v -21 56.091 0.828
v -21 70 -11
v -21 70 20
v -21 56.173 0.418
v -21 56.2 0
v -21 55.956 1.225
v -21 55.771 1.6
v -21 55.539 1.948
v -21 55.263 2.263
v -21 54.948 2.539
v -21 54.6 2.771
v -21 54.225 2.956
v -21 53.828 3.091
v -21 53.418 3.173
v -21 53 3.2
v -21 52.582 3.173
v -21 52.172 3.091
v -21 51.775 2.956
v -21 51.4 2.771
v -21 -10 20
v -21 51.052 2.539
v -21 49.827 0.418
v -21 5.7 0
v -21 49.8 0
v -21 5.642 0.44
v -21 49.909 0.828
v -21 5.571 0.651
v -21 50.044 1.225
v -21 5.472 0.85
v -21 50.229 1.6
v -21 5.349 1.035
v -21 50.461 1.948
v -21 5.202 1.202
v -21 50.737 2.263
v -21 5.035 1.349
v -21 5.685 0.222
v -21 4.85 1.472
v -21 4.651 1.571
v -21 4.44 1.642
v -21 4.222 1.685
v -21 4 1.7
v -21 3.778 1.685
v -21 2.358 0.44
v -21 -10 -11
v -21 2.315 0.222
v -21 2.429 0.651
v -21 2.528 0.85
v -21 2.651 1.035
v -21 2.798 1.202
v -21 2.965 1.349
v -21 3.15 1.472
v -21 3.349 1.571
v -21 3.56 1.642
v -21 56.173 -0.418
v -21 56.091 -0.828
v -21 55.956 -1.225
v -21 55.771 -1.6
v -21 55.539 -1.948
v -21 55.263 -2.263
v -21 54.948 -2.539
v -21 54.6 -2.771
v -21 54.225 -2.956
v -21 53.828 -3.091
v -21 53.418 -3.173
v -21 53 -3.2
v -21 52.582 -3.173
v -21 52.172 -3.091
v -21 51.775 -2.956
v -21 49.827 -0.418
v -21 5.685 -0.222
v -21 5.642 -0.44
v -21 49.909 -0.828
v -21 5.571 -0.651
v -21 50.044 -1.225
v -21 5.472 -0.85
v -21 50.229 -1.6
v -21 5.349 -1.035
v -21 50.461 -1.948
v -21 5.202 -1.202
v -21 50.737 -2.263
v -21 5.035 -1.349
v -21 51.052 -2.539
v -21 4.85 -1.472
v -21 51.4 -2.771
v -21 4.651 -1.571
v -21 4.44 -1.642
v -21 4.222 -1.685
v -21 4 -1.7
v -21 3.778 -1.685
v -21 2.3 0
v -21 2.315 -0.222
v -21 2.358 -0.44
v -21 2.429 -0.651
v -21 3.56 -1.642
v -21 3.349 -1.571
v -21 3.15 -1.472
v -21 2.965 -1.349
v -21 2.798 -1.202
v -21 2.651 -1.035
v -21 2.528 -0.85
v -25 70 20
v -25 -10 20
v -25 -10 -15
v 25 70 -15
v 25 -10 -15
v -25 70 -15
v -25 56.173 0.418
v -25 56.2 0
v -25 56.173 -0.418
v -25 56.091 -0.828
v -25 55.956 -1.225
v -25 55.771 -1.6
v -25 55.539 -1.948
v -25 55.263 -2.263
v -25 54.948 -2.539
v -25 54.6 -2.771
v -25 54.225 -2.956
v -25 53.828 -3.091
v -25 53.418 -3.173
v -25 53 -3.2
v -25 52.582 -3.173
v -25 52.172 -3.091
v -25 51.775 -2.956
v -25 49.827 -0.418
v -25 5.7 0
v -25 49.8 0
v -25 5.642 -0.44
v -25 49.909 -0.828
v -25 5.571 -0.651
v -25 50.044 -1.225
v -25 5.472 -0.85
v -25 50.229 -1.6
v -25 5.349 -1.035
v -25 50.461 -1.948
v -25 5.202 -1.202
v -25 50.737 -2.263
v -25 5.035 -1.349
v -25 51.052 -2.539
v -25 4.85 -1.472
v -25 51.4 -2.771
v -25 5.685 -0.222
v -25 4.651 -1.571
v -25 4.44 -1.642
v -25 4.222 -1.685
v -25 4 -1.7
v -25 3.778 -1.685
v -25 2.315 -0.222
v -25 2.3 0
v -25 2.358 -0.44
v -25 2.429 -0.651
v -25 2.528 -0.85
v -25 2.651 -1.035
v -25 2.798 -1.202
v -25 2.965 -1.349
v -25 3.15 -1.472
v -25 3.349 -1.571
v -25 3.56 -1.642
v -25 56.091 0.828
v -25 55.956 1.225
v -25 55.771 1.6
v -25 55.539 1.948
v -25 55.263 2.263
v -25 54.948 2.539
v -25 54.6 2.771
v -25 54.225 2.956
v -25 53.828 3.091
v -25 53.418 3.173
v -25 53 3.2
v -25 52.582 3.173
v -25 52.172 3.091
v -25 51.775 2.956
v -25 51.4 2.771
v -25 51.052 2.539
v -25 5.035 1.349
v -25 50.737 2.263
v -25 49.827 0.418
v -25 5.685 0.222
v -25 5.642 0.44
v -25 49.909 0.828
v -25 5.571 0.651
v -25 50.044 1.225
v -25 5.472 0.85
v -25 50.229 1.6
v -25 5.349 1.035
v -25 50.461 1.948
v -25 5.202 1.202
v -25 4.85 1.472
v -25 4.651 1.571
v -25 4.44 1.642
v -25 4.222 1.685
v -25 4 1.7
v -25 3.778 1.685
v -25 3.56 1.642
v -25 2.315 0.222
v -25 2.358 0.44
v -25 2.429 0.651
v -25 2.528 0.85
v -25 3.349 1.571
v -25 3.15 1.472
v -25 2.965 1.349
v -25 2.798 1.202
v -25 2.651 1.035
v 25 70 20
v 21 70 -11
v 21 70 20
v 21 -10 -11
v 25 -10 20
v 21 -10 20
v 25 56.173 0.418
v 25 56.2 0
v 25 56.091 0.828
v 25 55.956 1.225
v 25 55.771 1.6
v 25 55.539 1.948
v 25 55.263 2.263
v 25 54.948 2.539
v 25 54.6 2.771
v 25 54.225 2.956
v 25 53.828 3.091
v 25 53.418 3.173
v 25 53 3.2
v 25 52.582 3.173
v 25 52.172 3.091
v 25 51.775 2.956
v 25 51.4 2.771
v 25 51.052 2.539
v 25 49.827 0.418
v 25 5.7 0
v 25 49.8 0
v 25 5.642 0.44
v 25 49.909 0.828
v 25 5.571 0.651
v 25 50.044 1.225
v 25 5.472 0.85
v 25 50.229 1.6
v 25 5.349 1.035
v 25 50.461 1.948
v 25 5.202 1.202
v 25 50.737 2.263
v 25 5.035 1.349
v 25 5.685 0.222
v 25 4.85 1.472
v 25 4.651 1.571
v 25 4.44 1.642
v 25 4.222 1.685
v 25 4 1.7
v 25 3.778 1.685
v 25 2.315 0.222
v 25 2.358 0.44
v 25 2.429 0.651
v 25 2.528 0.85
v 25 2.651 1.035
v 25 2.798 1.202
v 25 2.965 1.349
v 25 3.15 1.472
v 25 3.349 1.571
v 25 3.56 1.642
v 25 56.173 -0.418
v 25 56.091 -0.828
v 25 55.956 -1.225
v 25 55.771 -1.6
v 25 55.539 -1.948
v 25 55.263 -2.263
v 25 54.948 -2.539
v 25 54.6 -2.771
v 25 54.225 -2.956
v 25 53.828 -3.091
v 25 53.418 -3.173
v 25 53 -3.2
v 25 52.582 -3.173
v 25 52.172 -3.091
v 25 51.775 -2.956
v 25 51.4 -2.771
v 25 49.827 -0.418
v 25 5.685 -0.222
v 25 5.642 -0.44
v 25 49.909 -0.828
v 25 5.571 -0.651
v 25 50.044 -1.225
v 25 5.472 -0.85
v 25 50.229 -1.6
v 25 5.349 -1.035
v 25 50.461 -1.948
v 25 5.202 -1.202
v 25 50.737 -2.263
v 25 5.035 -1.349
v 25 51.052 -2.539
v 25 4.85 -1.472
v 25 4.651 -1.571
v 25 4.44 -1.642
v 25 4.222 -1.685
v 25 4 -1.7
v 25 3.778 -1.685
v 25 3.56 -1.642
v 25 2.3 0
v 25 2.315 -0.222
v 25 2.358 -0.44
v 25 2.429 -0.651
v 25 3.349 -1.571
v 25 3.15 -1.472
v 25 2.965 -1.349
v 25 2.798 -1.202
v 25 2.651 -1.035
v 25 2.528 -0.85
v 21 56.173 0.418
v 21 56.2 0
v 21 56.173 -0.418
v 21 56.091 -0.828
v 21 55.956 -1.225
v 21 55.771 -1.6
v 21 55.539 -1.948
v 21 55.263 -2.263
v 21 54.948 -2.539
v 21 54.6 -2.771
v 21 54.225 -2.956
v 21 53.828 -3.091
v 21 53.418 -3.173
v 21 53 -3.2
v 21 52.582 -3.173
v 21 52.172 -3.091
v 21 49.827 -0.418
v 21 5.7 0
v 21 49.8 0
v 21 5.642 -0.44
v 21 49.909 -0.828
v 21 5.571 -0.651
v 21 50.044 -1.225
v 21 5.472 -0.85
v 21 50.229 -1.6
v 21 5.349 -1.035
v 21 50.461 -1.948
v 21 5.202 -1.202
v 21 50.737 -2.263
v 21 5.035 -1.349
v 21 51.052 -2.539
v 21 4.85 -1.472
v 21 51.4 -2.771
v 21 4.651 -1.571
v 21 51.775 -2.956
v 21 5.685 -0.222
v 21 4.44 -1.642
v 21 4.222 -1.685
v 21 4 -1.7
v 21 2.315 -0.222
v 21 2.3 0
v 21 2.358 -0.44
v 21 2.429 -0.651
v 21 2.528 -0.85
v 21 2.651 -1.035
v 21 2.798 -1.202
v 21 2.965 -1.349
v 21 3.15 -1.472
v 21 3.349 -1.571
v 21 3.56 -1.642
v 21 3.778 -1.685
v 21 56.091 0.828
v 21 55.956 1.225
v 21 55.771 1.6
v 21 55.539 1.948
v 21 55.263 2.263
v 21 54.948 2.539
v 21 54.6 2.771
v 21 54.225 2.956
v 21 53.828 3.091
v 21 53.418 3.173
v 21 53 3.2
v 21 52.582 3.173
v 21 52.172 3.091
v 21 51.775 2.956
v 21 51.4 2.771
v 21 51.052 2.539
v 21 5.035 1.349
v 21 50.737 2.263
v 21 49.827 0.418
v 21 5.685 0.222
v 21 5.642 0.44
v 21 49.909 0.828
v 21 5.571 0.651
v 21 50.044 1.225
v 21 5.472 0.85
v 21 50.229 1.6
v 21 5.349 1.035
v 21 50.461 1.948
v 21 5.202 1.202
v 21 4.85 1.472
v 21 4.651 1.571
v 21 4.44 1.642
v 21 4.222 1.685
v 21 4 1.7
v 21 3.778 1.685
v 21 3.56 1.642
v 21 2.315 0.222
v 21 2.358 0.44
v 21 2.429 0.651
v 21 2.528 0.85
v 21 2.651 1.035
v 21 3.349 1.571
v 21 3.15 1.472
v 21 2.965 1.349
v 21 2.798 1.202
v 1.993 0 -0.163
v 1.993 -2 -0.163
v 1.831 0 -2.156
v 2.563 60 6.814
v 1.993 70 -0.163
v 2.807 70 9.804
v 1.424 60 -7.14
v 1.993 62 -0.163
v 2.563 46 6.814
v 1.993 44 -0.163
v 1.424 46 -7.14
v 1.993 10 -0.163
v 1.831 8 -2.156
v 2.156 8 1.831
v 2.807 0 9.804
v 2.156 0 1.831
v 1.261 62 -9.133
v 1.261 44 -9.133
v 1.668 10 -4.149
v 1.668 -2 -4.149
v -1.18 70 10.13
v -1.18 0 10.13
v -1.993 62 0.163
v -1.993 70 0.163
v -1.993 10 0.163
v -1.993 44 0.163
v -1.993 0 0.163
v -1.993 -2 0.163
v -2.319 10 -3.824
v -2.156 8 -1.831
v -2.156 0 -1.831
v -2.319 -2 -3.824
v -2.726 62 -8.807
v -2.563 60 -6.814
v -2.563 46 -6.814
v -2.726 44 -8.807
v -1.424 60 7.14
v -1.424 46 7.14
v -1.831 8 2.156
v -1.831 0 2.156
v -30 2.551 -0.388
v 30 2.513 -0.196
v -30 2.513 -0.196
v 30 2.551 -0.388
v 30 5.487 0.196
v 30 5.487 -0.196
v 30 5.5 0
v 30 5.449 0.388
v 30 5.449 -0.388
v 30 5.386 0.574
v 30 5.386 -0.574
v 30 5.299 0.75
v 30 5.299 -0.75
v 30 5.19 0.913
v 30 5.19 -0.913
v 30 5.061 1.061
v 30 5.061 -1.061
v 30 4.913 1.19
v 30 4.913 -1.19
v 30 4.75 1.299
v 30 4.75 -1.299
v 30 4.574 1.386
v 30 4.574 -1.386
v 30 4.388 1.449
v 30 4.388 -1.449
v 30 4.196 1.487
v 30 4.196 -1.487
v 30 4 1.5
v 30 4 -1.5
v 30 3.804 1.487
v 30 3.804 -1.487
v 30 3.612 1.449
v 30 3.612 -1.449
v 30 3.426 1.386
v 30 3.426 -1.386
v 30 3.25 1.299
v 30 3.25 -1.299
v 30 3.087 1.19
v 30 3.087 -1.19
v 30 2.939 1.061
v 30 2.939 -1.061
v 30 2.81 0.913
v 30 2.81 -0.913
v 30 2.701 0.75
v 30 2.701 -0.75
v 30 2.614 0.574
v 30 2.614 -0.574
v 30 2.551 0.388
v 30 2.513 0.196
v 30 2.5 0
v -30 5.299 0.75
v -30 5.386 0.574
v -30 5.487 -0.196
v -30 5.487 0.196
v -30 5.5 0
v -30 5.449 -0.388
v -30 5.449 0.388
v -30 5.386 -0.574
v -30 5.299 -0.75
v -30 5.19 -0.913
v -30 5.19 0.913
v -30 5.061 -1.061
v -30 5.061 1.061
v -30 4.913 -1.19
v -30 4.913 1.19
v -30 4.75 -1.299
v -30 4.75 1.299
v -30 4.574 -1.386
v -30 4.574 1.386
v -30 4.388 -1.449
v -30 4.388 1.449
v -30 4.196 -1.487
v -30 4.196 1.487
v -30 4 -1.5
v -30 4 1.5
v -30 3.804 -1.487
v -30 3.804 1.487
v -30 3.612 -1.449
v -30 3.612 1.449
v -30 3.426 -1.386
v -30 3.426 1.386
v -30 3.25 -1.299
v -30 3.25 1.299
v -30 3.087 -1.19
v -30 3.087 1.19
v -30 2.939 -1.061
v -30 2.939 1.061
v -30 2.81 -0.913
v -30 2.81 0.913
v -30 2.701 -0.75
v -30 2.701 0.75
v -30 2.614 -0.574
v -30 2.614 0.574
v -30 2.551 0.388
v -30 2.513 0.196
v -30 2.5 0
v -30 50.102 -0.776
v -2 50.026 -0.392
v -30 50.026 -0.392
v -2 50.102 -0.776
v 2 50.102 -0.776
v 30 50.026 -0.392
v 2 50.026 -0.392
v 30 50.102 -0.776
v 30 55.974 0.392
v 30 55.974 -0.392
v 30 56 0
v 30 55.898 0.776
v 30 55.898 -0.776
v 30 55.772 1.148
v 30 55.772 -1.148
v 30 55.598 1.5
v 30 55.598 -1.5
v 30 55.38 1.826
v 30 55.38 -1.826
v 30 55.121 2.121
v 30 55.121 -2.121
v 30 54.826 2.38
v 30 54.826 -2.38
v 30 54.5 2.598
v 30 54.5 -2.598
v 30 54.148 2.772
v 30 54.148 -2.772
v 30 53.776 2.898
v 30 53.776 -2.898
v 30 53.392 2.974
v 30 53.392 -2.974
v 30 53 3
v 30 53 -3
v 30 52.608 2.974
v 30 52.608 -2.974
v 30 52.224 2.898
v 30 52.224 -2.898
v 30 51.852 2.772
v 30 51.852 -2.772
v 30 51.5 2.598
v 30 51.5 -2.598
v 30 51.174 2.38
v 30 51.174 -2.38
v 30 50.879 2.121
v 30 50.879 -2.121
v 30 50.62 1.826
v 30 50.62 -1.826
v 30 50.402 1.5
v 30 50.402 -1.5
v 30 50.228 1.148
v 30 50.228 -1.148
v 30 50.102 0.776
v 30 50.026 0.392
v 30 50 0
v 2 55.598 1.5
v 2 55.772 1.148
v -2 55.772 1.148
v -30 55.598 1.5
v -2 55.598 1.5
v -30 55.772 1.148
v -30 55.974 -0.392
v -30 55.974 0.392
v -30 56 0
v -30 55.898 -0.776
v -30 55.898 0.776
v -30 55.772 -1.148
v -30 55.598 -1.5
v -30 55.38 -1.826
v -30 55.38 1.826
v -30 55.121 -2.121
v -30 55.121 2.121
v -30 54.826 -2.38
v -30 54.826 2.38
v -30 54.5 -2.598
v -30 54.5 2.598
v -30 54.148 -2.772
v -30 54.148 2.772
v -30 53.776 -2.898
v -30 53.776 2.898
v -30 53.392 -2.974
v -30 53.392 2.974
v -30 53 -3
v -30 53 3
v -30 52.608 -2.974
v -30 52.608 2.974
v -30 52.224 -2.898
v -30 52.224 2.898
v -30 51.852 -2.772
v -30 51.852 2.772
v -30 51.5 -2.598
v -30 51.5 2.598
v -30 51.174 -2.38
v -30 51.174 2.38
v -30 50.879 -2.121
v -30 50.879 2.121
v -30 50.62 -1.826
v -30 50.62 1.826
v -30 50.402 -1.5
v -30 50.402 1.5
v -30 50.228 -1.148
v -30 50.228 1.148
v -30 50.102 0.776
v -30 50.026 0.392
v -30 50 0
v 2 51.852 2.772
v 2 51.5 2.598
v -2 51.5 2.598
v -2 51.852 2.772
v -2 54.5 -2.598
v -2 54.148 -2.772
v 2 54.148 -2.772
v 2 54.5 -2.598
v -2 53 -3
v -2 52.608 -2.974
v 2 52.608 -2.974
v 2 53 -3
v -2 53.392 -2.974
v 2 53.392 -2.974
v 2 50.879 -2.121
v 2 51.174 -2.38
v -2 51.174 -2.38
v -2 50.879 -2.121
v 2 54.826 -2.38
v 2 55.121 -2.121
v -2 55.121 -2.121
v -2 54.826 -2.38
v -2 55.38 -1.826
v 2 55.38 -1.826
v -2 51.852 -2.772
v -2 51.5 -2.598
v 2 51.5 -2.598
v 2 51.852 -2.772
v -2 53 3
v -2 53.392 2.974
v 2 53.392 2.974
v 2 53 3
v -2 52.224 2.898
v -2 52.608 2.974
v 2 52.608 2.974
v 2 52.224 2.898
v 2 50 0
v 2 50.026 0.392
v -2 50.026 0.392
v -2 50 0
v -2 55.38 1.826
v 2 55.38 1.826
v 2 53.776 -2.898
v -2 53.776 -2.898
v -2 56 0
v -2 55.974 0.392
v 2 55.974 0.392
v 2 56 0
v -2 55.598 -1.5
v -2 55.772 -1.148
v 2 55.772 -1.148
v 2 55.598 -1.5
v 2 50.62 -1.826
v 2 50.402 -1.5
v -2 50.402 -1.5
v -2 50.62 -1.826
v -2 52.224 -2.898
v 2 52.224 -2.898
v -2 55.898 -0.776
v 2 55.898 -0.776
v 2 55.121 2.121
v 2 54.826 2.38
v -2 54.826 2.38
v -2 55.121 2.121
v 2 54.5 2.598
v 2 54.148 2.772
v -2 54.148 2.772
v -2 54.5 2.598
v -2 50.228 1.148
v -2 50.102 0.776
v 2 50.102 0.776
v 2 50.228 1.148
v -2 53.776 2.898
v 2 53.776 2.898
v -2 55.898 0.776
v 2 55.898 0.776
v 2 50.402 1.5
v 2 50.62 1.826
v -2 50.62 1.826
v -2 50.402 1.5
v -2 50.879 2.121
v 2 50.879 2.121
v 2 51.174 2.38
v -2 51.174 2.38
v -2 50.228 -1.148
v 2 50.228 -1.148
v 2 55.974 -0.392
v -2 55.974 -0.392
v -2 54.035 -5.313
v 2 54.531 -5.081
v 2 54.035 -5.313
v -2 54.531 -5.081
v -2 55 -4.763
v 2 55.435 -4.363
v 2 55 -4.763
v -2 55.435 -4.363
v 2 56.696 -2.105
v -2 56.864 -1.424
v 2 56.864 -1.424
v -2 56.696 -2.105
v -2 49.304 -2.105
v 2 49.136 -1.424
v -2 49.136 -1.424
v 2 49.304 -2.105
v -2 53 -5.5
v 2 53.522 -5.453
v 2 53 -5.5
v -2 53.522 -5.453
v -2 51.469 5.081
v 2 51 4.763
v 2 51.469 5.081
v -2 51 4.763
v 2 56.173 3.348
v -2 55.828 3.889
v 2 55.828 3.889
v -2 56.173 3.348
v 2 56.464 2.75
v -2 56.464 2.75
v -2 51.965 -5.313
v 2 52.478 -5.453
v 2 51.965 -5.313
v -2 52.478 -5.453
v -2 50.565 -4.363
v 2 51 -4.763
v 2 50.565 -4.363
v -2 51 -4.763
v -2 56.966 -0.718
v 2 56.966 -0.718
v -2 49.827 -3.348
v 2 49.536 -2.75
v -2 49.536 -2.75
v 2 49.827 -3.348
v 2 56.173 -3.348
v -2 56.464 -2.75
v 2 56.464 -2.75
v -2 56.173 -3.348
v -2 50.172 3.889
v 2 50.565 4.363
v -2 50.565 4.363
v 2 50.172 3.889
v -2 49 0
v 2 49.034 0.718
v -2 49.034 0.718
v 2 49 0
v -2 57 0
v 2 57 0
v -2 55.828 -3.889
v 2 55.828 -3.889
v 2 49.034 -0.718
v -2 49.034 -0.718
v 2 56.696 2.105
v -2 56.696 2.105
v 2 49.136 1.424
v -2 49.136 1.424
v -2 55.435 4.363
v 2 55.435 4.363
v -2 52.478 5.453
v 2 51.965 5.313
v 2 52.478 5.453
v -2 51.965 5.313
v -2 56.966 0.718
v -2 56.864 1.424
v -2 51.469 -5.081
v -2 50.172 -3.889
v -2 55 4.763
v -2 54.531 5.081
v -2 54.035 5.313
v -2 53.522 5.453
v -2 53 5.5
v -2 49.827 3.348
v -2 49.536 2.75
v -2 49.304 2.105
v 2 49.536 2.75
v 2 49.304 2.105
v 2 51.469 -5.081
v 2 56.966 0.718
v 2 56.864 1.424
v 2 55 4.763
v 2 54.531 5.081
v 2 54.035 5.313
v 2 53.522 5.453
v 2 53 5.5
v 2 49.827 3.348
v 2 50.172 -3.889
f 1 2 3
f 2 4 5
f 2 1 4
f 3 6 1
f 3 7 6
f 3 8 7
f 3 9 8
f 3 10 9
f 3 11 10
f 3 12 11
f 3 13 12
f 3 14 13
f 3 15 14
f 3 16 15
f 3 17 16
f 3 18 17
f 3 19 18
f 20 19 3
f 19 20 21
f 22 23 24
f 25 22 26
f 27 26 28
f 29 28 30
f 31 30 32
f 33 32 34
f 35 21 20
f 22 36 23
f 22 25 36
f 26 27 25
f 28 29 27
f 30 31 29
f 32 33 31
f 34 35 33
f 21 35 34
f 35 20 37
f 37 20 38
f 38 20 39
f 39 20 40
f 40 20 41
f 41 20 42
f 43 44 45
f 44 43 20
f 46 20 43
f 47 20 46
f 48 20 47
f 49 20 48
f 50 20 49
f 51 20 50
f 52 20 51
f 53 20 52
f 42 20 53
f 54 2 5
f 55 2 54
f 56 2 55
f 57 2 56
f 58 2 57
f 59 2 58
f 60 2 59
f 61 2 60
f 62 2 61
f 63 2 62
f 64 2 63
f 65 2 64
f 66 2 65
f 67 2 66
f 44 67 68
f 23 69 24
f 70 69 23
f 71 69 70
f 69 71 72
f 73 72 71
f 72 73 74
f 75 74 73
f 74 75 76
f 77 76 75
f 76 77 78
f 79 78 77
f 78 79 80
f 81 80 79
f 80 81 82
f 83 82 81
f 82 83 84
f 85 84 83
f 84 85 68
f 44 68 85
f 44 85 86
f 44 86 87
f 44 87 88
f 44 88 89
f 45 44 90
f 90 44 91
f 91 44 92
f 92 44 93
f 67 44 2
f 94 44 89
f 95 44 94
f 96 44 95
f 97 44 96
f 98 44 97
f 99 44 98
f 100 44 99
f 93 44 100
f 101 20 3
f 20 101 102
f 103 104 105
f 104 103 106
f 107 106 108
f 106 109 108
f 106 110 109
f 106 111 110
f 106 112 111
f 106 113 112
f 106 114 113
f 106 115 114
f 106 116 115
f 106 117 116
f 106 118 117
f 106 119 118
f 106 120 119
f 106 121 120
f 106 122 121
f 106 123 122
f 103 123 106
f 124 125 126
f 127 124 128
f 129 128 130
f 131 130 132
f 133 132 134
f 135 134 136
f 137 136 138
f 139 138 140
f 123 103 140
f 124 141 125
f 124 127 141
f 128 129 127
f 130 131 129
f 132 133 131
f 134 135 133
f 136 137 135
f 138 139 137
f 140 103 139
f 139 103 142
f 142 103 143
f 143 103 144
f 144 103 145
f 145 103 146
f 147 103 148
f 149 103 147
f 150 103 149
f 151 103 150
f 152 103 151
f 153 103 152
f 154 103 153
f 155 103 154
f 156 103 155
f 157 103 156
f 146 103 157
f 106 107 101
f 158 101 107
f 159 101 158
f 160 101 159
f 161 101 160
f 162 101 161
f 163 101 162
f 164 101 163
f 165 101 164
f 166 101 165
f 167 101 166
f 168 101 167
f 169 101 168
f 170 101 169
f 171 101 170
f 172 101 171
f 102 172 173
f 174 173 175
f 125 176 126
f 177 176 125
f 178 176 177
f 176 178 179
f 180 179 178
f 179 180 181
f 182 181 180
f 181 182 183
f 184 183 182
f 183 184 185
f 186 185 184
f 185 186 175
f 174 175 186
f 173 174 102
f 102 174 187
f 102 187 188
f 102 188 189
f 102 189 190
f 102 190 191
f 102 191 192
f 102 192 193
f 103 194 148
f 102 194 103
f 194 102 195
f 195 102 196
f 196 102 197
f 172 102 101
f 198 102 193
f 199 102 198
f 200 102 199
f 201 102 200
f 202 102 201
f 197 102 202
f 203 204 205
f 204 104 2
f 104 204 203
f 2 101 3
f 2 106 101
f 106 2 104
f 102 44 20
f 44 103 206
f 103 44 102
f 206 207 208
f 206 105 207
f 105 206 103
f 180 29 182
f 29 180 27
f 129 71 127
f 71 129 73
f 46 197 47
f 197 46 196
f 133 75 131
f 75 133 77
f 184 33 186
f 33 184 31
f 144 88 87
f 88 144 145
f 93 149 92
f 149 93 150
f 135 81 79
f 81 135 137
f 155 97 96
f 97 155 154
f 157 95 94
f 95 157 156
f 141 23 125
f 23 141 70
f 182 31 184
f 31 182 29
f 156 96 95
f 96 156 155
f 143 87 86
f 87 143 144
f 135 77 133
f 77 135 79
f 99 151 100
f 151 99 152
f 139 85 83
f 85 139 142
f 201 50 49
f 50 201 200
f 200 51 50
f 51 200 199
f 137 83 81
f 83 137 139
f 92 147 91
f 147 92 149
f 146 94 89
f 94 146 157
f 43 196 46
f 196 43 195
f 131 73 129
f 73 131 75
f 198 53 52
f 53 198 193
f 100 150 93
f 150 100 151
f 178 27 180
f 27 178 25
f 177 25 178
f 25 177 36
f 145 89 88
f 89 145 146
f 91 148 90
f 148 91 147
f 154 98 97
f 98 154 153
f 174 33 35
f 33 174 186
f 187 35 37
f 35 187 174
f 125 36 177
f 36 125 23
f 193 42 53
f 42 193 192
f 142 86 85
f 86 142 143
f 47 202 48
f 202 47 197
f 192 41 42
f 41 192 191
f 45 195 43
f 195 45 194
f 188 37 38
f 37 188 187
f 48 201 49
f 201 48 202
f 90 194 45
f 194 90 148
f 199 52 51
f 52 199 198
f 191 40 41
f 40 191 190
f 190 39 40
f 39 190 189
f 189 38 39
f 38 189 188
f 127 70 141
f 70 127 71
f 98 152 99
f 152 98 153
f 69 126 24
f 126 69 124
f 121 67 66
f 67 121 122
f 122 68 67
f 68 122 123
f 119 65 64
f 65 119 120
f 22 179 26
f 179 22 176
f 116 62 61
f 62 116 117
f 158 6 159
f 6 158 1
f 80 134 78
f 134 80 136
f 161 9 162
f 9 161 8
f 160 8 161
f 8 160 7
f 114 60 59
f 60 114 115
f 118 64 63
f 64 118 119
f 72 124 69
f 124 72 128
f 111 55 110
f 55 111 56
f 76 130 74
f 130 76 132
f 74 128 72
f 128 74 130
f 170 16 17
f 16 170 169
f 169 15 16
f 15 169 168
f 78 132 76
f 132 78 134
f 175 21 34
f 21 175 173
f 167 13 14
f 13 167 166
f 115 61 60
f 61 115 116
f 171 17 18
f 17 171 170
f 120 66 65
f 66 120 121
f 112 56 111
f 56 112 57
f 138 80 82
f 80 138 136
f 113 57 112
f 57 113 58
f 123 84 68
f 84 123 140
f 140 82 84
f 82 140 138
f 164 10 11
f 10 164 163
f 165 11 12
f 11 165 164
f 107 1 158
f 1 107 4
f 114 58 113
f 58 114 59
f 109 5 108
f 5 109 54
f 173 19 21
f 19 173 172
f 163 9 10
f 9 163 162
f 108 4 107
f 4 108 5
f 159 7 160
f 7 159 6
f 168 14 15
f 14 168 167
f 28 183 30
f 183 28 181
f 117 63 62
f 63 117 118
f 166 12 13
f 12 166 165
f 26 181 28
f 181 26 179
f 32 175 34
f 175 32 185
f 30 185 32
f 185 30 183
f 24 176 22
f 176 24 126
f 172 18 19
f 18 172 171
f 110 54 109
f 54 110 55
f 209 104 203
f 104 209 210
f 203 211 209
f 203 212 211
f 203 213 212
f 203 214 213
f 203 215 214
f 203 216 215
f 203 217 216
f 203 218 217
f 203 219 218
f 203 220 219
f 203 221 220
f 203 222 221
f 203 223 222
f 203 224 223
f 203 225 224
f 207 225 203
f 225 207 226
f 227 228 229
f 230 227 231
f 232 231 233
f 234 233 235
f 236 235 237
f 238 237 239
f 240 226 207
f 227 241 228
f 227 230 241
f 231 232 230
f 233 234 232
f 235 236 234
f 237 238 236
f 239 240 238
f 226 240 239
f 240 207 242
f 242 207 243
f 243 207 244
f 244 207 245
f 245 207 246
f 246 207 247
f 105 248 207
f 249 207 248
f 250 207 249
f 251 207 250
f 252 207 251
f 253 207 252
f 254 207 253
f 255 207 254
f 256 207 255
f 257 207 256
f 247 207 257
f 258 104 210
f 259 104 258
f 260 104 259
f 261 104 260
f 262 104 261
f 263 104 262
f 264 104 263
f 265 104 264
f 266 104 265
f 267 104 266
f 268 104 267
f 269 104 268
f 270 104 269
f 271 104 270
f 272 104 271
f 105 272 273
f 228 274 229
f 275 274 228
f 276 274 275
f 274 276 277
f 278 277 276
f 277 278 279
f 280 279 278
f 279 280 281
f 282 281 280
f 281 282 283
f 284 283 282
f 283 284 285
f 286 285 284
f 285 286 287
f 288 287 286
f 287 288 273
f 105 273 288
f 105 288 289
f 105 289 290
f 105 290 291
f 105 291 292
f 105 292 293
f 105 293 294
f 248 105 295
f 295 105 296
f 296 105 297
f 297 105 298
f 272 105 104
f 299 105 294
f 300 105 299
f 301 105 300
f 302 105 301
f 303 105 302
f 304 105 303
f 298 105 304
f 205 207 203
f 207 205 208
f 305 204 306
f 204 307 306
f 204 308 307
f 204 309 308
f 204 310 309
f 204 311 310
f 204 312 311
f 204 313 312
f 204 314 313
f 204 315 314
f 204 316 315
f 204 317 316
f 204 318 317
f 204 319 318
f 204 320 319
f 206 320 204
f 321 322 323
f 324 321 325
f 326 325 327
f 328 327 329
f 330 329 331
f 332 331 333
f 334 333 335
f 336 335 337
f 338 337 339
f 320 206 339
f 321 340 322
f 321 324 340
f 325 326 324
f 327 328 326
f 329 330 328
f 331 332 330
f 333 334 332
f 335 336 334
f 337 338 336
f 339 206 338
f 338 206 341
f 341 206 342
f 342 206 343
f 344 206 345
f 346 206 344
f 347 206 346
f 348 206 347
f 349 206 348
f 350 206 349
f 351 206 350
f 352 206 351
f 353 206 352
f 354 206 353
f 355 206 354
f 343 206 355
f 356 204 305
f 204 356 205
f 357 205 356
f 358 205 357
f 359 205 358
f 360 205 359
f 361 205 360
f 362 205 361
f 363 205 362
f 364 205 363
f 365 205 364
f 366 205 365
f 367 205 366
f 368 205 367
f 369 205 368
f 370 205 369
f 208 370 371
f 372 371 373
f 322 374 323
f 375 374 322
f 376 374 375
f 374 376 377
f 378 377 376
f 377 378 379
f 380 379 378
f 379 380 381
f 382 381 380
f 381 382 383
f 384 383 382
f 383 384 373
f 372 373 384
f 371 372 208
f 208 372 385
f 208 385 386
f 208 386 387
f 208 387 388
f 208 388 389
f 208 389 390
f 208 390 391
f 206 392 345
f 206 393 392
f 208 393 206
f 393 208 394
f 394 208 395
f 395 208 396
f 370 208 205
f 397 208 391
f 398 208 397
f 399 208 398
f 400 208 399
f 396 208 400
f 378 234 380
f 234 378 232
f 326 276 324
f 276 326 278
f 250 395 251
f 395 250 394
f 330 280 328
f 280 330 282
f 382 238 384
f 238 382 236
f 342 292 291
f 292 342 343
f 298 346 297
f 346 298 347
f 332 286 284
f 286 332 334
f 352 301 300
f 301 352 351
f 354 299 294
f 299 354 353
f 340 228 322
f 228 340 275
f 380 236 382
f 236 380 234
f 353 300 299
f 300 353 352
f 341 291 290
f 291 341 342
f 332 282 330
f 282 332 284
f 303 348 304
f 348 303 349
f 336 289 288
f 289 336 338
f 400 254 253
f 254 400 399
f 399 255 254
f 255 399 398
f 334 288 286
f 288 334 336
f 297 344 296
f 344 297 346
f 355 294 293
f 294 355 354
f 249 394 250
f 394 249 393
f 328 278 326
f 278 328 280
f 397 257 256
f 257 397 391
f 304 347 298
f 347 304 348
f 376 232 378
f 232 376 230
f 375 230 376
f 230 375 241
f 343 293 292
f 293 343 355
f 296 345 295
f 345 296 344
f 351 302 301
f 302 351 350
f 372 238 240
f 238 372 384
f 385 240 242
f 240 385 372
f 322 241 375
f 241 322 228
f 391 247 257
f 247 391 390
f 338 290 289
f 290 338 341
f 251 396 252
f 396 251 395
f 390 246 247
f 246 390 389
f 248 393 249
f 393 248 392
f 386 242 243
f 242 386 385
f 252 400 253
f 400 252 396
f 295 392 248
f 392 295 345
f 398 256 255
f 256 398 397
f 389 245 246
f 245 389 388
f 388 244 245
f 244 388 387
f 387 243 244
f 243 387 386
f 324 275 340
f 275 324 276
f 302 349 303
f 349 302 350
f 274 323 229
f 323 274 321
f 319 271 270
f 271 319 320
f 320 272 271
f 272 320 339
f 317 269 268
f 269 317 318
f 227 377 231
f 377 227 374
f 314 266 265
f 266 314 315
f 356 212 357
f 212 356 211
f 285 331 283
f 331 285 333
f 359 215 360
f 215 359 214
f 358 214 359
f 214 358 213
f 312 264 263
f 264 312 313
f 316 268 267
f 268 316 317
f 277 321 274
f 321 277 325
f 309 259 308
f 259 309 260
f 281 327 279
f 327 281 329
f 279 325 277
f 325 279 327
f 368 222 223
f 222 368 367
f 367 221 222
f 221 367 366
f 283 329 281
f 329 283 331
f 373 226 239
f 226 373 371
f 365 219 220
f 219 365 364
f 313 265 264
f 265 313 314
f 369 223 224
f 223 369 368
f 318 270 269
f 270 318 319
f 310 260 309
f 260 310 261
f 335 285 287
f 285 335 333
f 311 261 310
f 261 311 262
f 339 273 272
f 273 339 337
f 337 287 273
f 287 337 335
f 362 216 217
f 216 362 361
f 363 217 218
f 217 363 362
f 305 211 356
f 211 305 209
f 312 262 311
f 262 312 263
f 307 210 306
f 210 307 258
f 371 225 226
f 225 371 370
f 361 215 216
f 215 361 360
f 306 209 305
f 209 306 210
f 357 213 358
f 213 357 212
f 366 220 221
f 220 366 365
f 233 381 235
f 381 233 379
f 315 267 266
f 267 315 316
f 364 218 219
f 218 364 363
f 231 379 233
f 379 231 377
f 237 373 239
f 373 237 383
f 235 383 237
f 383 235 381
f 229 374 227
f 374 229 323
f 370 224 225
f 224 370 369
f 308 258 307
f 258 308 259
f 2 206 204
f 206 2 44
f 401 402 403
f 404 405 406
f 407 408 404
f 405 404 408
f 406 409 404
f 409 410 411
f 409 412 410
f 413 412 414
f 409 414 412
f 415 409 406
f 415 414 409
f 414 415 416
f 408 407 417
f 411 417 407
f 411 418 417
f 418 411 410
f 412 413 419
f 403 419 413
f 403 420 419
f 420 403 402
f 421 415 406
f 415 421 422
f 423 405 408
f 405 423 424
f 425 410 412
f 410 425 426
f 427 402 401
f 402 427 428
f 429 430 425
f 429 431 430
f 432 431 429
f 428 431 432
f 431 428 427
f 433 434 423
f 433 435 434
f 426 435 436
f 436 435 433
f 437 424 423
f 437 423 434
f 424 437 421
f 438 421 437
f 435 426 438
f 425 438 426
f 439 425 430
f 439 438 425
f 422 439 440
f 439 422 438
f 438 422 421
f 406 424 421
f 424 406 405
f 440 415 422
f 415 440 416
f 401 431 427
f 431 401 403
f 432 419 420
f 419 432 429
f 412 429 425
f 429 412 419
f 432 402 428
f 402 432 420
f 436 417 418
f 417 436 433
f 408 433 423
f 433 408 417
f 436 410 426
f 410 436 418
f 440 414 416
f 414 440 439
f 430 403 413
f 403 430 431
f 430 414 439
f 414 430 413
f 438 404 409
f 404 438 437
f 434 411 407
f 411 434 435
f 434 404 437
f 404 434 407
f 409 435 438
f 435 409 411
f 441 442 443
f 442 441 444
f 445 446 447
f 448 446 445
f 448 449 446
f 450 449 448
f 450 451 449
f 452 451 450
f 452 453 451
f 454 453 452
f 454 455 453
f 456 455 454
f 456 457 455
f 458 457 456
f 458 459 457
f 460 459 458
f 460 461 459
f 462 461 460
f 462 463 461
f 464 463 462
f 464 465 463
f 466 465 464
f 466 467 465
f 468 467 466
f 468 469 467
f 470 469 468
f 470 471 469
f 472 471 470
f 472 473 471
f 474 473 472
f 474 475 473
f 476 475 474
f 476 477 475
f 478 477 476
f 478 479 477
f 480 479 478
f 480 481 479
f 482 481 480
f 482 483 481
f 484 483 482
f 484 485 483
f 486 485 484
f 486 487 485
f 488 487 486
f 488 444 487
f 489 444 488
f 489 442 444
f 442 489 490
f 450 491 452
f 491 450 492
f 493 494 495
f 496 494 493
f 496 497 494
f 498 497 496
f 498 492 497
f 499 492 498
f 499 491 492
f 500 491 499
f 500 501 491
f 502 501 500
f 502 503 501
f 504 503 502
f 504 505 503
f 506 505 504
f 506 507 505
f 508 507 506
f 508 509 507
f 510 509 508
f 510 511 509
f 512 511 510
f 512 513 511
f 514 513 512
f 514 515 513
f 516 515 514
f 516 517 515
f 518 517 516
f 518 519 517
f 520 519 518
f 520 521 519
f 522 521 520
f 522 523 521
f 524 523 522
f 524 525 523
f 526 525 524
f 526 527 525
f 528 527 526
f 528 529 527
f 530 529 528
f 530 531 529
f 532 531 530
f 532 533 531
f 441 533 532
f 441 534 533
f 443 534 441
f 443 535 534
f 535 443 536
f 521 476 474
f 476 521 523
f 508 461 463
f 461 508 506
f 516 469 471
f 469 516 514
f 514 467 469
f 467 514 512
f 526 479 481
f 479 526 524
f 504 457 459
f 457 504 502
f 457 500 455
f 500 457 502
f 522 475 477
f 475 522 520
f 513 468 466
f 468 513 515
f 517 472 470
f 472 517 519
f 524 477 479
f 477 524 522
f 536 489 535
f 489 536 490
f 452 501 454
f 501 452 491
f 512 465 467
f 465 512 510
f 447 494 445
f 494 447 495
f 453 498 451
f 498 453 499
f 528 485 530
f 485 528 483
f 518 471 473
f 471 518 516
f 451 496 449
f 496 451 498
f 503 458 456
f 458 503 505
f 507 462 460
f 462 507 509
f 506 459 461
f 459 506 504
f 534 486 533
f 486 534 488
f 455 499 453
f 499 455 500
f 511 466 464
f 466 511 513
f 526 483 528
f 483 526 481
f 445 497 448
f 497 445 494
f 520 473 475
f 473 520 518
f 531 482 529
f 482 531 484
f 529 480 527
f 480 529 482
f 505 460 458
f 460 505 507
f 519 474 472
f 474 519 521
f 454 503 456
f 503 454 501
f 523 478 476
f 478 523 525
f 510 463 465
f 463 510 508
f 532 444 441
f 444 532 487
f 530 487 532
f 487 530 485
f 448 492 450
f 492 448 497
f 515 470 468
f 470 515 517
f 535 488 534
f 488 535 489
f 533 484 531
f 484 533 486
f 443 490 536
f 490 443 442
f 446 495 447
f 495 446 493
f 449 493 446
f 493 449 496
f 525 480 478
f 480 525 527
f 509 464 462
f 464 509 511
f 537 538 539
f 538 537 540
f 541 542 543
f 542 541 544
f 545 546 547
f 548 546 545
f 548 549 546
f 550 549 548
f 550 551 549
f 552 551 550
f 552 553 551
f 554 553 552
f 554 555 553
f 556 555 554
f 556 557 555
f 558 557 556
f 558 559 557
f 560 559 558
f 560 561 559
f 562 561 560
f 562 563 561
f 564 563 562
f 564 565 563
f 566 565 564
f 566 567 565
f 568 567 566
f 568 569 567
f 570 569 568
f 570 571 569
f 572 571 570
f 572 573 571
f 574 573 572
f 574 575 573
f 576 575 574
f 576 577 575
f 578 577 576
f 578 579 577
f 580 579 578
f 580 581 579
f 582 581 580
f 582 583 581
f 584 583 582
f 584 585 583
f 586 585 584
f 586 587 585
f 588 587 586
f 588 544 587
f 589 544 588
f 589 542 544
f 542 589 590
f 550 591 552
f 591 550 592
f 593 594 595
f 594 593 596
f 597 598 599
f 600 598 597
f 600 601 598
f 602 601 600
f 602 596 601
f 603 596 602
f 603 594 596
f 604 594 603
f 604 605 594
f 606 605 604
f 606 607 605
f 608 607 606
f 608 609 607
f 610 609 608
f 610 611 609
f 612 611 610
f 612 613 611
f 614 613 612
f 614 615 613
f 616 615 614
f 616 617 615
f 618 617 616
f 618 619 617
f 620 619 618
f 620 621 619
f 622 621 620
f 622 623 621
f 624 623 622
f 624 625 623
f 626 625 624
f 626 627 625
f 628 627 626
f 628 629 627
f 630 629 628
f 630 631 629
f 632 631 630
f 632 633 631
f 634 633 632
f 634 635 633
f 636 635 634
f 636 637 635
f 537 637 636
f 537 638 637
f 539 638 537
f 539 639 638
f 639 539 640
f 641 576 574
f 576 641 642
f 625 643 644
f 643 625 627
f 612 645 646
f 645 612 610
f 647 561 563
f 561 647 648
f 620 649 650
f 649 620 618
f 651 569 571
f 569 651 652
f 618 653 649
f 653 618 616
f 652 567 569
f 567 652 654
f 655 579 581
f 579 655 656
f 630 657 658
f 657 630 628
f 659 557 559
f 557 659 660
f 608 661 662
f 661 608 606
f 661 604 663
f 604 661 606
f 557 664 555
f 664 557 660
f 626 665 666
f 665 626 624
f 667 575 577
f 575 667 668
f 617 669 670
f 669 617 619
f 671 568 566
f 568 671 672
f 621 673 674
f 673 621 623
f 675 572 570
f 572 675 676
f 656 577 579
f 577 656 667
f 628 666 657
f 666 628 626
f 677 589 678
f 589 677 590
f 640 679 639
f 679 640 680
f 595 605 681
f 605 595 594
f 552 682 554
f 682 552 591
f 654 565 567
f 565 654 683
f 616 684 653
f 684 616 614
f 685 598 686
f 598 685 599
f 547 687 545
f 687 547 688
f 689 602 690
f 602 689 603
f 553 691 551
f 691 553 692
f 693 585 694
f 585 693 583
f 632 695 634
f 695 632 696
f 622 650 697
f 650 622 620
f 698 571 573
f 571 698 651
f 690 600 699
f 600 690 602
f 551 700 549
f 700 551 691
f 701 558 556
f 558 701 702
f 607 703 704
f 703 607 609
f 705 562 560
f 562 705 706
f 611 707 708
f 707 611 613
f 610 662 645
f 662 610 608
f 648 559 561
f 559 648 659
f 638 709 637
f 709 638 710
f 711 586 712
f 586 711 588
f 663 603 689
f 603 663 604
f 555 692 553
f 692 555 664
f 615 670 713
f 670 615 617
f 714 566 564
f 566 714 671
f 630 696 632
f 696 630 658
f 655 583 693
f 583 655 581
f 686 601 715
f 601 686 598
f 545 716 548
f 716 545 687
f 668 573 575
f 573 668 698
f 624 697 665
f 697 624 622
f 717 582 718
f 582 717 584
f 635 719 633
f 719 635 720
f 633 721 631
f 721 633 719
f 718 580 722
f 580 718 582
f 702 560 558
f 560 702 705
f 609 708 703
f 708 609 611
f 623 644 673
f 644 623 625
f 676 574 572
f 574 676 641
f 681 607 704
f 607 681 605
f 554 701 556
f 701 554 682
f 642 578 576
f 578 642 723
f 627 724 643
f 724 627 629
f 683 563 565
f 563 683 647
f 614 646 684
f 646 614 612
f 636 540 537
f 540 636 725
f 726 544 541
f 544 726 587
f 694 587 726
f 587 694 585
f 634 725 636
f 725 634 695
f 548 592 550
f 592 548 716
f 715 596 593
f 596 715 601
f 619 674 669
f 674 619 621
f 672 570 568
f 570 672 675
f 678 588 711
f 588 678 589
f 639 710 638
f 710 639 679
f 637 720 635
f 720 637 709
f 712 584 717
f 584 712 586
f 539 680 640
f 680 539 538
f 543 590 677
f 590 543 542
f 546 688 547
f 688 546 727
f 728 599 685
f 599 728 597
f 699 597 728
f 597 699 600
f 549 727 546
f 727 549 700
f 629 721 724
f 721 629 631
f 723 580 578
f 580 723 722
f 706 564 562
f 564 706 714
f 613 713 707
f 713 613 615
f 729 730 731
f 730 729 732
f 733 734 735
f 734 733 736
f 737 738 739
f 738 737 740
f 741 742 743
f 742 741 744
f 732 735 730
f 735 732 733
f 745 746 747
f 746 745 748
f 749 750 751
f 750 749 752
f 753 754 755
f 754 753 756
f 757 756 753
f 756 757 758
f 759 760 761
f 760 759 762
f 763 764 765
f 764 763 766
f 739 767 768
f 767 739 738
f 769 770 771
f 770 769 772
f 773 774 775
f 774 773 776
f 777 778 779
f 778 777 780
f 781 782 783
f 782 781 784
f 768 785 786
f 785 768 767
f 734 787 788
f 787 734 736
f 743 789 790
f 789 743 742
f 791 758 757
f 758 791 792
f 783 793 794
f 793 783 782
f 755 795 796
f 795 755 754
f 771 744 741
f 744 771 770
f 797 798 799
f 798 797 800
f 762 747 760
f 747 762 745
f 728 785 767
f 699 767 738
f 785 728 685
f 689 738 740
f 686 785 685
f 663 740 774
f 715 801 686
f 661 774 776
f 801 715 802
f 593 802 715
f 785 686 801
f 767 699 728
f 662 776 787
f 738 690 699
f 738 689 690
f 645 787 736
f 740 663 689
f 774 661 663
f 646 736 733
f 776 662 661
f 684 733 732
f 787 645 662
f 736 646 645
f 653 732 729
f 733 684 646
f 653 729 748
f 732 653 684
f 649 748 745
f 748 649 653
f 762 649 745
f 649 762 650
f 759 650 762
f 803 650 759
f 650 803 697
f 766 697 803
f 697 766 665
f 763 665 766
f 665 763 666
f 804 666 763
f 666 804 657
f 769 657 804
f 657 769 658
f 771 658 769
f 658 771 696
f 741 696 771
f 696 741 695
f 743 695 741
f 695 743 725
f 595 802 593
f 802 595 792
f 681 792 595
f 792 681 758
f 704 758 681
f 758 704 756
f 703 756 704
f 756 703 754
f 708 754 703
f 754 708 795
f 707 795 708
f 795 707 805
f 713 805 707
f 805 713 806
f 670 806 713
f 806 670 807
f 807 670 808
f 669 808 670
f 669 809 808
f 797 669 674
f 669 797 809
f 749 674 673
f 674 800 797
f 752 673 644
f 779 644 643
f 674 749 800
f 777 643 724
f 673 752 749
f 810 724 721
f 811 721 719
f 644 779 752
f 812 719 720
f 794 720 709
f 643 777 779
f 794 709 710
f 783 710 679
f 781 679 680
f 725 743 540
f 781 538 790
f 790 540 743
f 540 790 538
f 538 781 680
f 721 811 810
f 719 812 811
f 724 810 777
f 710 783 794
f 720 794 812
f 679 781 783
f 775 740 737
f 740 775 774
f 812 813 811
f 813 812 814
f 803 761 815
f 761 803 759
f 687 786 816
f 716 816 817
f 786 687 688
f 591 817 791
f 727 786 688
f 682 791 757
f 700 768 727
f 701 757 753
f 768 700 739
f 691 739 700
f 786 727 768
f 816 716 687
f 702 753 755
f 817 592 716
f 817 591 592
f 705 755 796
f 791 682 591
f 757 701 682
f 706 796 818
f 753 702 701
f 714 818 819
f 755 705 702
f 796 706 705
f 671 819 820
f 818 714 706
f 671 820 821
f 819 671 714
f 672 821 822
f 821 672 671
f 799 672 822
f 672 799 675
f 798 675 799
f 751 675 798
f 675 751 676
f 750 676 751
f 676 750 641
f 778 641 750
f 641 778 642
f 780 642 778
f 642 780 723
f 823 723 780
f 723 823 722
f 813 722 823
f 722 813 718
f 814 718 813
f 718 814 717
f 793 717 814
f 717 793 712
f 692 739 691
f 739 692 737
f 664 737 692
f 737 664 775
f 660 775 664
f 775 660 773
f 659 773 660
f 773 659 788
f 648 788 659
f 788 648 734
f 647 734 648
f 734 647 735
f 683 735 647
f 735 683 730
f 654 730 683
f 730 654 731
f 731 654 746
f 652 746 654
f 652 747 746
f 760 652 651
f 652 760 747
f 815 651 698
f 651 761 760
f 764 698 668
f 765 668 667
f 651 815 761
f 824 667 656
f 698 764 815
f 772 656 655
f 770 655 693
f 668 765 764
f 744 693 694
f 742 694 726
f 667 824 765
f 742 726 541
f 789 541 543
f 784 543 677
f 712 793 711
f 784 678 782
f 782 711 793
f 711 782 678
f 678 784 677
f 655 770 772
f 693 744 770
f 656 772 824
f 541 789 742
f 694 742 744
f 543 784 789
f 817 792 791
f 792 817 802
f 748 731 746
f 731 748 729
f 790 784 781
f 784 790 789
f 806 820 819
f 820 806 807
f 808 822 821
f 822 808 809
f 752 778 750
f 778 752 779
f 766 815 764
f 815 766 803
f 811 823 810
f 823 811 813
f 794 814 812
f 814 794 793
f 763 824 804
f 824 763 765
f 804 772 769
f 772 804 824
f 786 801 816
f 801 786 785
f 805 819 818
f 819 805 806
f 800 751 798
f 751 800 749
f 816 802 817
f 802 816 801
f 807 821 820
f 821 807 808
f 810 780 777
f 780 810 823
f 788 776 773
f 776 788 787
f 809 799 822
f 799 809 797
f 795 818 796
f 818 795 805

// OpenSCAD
/*
 * SINGLE WAVE TEST - 2mm WALLS
 *
 * Tests:
 * - 2mm thick walls around hinge slot
 * - 2mm thick walls around cam housing
 * - Cam fits and rotates inside housing
 * - Wave pivots smoothly on hinge axle
 */

// ============================================
// ANIMATION
// ============================================

MANUAL_ANGLE = -1;
theta = (MANUAL_ANGLE >= 0) ? MANUAL_ANGLE : $t * 360;

// ============================================
// SHOW/HIDE
// ============================================

SHOW_WAVE = true;
SHOW_CAM = true;
SHOW_HINGE_AXLE = true;
SHOW_CAMSHAFT = true;
SHOW_FRAME = true;

// ============================================
// WALL THICKNESS
// ============================================

WALL = 2;  // 2mm walls

// ============================================
// WAVE PARAMETERS
// ============================================

WAVE_LENGTH = 70;
WAVE_BODY_HEIGHT = 10;
WAVE_THICKNESS = 4;

// ============================================
// HINGE SLOT
// ============================================

HINGE_SLOT_LENGTH = 8;       // OPTIMIZED
HINGE_SLOT_HEIGHT = 4;
HINGE_SLOT_CENTER_Y = 4;     // OPTIMIZED
HINGE_SLOT_CENTER_Z = 0;

// Extension with walls
HINGE_EXT_WIDTH = HINGE_SLOT_LENGTH + 2 * WALL;   // 16mm
HINGE_EXT_HEIGHT = HINGE_SLOT_HEIGHT + 2 * WALL;  // 8mm
HINGE_EXT_Y_START = HINGE_SLOT_CENTER_Y - HINGE_SLOT_LENGTH/2 - WALL;
HINGE_EXT_Z_BOTTOM = HINGE_SLOT_CENTER_Z - HINGE_SLOT_HEIGHT/2 - WALL;

// ============================================
// CAM HOUSING
// ============================================

CAM_HOUSING_SIZE = 14;
CAM_HOUSING_CENTER_Y = 53;
CAM_HOUSING_CENTER_Z = 0;

// Extension with walls
CAM_EXT_WIDTH = CAM_HOUSING_SIZE + 2 * WALL;   // 18mm
CAM_EXT_HEIGHT = CAM_HOUSING_SIZE + 2 * WALL;  // 18mm
CAM_EXT_Y_START = CAM_HOUSING_CENTER_Y - CAM_HOUSING_SIZE/2 - WALL;
CAM_EXT_Z_BOTTOM = CAM_HOUSING_CENTER_Z - CAM_HOUSING_SIZE/2 - WALL;

// ============================================
// SHAFTS
// ============================================

HINGE_AXLE_DIA = 3;
CAMSHAFT_DIA = 6;

// ============================================
// CAM (middle-dramatic for test)
// ============================================

CAM_MAJOR = 11;
CAM_MINOR = 8;
CAM_THICKNESS = 4;

// ============================================
// COLORS
// ============================================

C_WAVE = [0.75, 0.6, 0.45];
C_CAM = [0.8, 0.5, 0.2];
C_SHAFT = [0.5, 0.5, 0.55];
C_FRAME = [0.3, 0.25, 0.2];

$fn = 48;

// ============================================
// CALCULATIONS
// ============================================

LEVER_ARM = CAM_HOUSING_CENTER_Y - HINGE_SLOT_CENTER_Y;

cam_push_z = (CAM_MAJOR / 2) * sin(theta);
cam_push_y = (CAM_MINOR / 2) * cos(theta);

wave_pitch = atan2(cam_push_z, LEVER_ARM);
wave_roll = atan2(cam_push_y, LEVER_ARM);

// ============================================
// MODULES
// ============================================

// Wave slat with 2mm walls
module wave_slat() {
    color(C_WAVE)
    translate([0, HINGE_SLOT_CENTER_Y, HINGE_SLOT_CENTER_Z])
        rotate([wave_pitch, wave_roll, 0])
            translate([0, -HINGE_SLOT_CENTER_Y, -HINGE_SLOT_CENTER_Z])
                difference() {
                    union() {
                        // Main wave body
                        translate([-WAVE_THICKNESS/2, 0, 0])
                            cube([WAVE_THICKNESS, WAVE_LENGTH, WAVE_BODY_HEIGHT]);

                        // Hinge extension (slot + 2mm walls)
                        translate([-WAVE_THICKNESS/2, HINGE_EXT_Y_START, HINGE_EXT_Z_BOTTOM])
                            cube([WAVE_THICKNESS, HINGE_EXT_WIDTH, -HINGE_EXT_Z_BOTTOM]);

                        // Cam housing extension (housing + 2mm walls)
                        translate([-WAVE_THICKNESS/2, CAM_EXT_Y_START, CAM_EXT_Z_BOTTOM])
                            cube([WAVE_THICKNESS, CAM_EXT_WIDTH, -CAM_EXT_Z_BOTTOM]);
                    }

                    // Hinge slot cutout
                    translate([-WAVE_THICKNESS/2 - 1,
                               HINGE_SLOT_CENTER_Y - HINGE_SLOT_LENGTH/2,
                               HINGE_SLOT_CENTER_Z - HINGE_SLOT_HEIGHT/2])
                        cube([WAVE_THICKNESS + 2, HINGE_SLOT_LENGTH, HINGE_SLOT_HEIGHT]);

                    // Cam housing cutout
                    translate([-WAVE_THICKNESS/2 - 1,
                               CAM_HOUSING_CENTER_Y - CAM_HOUSING_SIZE/2,
                               CAM_HOUSING_CENTER_Z - CAM_HOUSING_SIZE/2])
                        cube([WAVE_THICKNESS + 2, CAM_HOUSING_SIZE, CAM_HOUSING_SIZE]);
                }
}

// Elliptical cam on camshaft
module cam_on_shaft() {
    color(C_CAM)
    translate([0, CAM_HOUSING_CENTER_Y, CAM_HOUSING_CENTER_Z])
        rotate([0, 90, 0])
            rotate([0, 0, theta])
                scale([CAM_MAJOR/10, CAM_MINOR/10, 1])
                    cylinder(r=5, h=CAM_THICKNESS, center=true);
}

// Hinge axle
module hinge_axle() {
    color(C_SHAFT)
    translate([-30, HINGE_SLOT_CENTER_Y, HINGE_SLOT_CENTER_Z])
        rotate([0, 90, 0])
            cylinder(d=HINGE_AXLE_DIA, h=60);
}

// Camshaft
module camshaft() {
    color(C_SHAFT)
    translate([-30, CAM_HOUSING_CENTER_Y, CAM_HOUSING_CENTER_Z])
        rotate([0, 90, 0])
            cylinder(d=CAMSHAFT_DIA, h=60);
}

// Simple frame
module frame() {
    color(C_FRAME) {
        // Left wall
        translate([-25, -10, -15])
            difference() {
                cube([4, 80, 35]);
                translate([-1, HINGE_SLOT_CENTER_Y + 10, 15])
                    rotate([0, 90, 0]) cylinder(d=HINGE_AXLE_DIA+0.4, h=6);
                translate([-1, CAM_HOUSING_CENTER_Y + 10, 15])
                    rotate([0, 90, 0]) cylinder(d=CAMSHAFT_DIA+0.4, h=6);
            }

        // Right wall
        translate([21, -10, -15])
            difference() {
                cube([4, 80, 35]);
                translate([-1, HINGE_SLOT_CENTER_Y + 10, 15])
                    rotate([0, 90, 0]) cylinder(d=HINGE_AXLE_DIA+0.4, h=6);
                translate([-1, CAM_HOUSING_CENTER_Y + 10, 15])
                    rotate([0, 90, 0]) cylinder(d=CAMSHAFT_DIA+0.4, h=6);
            }

        // Base
        translate([-25, -10, -15])
            cube([50, 80, 4]);
    }
}

// ============================================
// ASSEMBLY
// ============================================

module test_assembly() {
    if (SHOW_FRAME) frame();
    if (SHOW_HINGE_AXLE) hinge_axle();
    if (SHOW_CAMSHAFT) camshaft();
    if (SHOW_CAM) cam_on_shaft();
    if (SHOW_WAVE) wave_slat();
}

// ============================================
// RENDER
// ============================================

test_assembly();

// ============================================
// DEBUG OUTPUT
// ============================================

echo("");
echo("╔════════════════════════════════════════════════════════════╗");
echo("║      SINGLE WAVE TEST - 2mm WALLS                          ║");
echo("╚════════════════════════════════════════════════════════════╝");
echo("");
echo("WALL VERIFICATION:");
echo(str("  Wall thickness: ", WALL, "mm"));
echo(str("  Hinge extension: ", HINGE_EXT_WIDTH, "×", -HINGE_EXT_Z_BOTTOM, "mm"));
echo(str("  Cam housing ext: ", CAM_EXT_WIDTH, "×", -CAM_EXT_Z_BOTTOM, "mm"));
echo("");
echo("CUTOUT INTERIORS:");
echo(str("  Hinge slot: ", HINGE_SLOT_LENGTH, "×", HINGE_SLOT_HEIGHT, "mm"));
echo(str("  Cam housing: ", CAM_HOUSING_SIZE, "×", CAM_HOUSING_SIZE, "mm"));
echo("");
echo(str("CAM: ", CAM_MAJOR, "×", CAM_MINOR, "mm"));
echo(str("  Diagonal: ", sqrt(CAM_MAJOR*CAM_MAJOR + CAM_MINOR*CAM_MINOR)/sqrt(2)*sqrt(2)));
echo(str("  Fits in ", CAM_HOUSING_SIZE, "mm housing? ",
         sqrt(CAM_MAJOR*CAM_MAJOR/4 + CAM_MINOR*CAM_MINOR/4)*2 < CAM_HOUSING_SIZE ? "YES" : "NO"));
echo("");
echo(str("Current angle: ", theta, "°"));
echo(str("Wave pitch: ", wave_pitch, "°"));
echo(str("Wave roll: ", wave_roll, "°"));
echo("");
echo("VISUAL CHECK:");
echo("  [ ] Walls visible around both cutouts (2mm thick)");
echo("  [ ] Cam stays inside housing at all angles");
echo("  [ ] Wave rocks smoothly up/down and toward/away");
echo("  [ ] No intersection between parts");
